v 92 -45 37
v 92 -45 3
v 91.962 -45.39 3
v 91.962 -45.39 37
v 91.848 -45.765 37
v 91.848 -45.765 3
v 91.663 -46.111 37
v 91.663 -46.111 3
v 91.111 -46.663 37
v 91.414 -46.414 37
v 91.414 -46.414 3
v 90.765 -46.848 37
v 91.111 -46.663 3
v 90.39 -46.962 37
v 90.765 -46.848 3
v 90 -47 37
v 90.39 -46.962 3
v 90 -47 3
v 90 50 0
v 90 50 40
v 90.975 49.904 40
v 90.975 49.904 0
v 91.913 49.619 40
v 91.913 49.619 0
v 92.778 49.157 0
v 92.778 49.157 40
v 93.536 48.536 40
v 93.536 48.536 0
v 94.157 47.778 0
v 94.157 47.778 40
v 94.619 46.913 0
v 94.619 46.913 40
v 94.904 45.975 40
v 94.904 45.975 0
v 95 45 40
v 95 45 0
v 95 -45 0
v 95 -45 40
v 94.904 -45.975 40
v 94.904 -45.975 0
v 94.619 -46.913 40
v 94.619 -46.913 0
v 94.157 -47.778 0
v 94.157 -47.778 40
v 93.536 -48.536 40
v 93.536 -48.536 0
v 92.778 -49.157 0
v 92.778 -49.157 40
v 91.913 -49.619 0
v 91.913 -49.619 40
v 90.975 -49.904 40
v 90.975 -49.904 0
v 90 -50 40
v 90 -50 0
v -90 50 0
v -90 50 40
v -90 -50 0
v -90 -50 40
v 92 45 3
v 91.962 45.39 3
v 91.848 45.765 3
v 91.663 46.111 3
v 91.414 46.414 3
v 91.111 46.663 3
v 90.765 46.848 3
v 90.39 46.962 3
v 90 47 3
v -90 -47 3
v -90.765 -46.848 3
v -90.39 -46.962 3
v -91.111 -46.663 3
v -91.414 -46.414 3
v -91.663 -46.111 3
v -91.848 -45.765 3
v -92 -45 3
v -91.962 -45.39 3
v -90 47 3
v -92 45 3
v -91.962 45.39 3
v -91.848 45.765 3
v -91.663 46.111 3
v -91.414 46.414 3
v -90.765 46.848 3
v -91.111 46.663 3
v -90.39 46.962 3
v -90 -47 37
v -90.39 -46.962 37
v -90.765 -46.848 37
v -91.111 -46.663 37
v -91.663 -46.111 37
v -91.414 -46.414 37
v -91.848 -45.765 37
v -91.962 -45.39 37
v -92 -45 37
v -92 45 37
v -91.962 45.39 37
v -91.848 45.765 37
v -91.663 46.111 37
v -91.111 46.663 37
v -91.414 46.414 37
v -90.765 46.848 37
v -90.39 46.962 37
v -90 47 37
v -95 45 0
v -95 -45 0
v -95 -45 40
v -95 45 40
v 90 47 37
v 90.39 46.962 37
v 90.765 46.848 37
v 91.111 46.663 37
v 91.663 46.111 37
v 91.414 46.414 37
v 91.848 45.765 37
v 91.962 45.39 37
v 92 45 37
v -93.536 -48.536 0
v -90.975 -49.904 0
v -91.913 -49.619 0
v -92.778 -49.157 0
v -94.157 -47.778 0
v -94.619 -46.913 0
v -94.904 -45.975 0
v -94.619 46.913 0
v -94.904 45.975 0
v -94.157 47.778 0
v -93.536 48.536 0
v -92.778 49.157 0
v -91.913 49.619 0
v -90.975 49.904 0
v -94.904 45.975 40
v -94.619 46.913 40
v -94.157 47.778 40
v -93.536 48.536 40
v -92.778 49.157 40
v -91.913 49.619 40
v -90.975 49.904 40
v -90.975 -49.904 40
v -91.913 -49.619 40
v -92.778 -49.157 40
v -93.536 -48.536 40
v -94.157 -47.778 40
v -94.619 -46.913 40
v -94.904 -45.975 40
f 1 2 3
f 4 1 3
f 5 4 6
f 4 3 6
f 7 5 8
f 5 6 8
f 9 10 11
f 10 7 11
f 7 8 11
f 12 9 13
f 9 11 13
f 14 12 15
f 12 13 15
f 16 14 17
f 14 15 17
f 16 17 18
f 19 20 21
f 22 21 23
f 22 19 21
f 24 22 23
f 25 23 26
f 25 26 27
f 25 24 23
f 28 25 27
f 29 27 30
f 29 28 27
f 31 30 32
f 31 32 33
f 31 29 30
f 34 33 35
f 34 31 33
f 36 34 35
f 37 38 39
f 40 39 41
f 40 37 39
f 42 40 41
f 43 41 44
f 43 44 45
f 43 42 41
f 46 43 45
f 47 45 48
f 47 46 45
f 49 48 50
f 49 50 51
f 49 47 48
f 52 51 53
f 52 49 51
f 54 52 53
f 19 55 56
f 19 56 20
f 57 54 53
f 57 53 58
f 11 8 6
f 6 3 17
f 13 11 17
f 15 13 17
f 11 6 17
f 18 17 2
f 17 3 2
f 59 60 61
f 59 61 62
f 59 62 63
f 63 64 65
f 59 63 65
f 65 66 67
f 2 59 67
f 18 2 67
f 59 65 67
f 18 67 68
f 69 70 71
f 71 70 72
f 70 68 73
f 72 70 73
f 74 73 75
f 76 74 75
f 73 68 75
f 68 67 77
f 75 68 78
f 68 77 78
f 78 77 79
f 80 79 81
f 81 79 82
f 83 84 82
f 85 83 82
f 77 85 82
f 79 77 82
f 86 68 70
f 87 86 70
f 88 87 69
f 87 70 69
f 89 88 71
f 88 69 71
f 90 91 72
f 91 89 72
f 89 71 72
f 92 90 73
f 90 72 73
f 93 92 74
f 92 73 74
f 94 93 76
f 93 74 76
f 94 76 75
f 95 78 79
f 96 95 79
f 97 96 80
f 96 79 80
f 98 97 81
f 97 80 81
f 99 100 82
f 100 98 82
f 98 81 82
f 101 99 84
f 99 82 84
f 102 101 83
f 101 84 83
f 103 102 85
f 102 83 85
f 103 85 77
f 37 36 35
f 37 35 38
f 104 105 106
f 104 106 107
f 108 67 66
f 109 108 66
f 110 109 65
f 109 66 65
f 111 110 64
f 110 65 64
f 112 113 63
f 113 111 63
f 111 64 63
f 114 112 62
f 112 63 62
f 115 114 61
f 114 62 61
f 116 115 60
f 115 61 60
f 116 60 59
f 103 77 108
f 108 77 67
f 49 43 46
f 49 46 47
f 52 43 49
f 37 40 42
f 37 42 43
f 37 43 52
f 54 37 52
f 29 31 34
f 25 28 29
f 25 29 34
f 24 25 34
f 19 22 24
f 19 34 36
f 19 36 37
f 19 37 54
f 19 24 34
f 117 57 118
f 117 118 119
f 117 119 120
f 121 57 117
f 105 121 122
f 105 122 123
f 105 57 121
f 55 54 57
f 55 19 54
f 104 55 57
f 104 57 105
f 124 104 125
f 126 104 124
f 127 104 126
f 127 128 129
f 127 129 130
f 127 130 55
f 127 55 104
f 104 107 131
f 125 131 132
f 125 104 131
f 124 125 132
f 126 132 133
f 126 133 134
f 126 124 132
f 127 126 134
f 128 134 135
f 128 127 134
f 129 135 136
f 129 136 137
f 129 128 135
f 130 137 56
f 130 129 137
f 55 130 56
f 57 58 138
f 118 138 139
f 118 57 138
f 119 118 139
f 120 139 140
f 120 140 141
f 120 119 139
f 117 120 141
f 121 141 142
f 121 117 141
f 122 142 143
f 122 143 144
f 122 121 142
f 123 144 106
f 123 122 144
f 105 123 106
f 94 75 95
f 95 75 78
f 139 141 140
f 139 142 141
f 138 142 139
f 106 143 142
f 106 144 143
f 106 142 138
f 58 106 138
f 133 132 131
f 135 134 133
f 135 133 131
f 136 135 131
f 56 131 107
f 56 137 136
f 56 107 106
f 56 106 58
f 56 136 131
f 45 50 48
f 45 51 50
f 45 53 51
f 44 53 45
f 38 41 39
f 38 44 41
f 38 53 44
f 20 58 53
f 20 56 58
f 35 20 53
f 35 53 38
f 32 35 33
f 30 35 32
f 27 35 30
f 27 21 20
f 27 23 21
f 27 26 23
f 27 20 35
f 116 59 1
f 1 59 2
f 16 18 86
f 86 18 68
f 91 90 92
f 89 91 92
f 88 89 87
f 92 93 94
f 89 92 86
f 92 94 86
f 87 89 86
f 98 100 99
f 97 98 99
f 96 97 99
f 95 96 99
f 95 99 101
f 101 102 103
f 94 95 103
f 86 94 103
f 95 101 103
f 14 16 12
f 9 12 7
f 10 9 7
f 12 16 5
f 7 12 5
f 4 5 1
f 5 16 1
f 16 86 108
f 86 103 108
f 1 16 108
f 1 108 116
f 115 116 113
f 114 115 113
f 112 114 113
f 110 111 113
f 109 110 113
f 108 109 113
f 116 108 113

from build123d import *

# Parameters (mm, degrees)
Y_KSEKLIK_EKSTR_ZYON1_DEPTH = 40
BO_ALTMA1_T                 = -3
Y_KSEKLIK_EKSTR_ZYON2_START = -3
Y_KSEKLIK_EKSTR_ZYON2_DEPTH = 3


with BuildPart() as part:
    # Çizim1 → Yükseklik-Ekstrüzyon1 (new body)
    with BuildSketch(Plane.XY):
        with BuildLine():
            Line((-90, 50), (90, 50))
            ThreePointArc((90, 50), (93.535533906, 48.535533906), (95, 45))
            Line((95, 45), (95, -45))
            ThreePointArc((95, -45), (93.535533906, -48.535533906), (90, -50))
            Line((90, -50), (-90, -50))
            ThreePointArc((-90, -50), (-93.535533906, -48.535533906), (-95, -45))
            Line((-95, -45), (-95, 45))
            ThreePointArc((-95, 45), (-93.535533906, 48.535533906), (-90, 50))
        make_face()
    extrude(amount=Y_KSEKLIK_EKSTR_ZYON1_DEPTH)

    # İç Boşaltma1
    bo_altma1_openings = [part.faces().sort_by_distance(p)[0] for p in [
        (0, 0, 40),
    ]]
    offset(amount=BO_ALTMA1_T, openings=bo_altma1_openings, kind=Kind.INTERSECTION)

    # Çizim2 → Yükseklik-Ekstrüzyon2 (add)
    with BuildSketch(Plane.XY.offset(40).offset(Y_KSEKLIK_EKSTR_ZYON2_START)):
        with BuildLine():
            Line((90, 47), (-90, 47))
            ThreePointArc((-90, 47), (-91.414213562, 46.414213562), (-92, 45))
            Line((-92, 45), (-92, -45))
            ThreePointArc((-92, -45), (-91.414213562, -46.414213562), (-90, -47))
            Line((-90, -47), (90, -47))
            ThreePointArc((90, -47), (91.414213562, -46.414213562), (92, -45))
            Line((92, -45), (92, 45))
            ThreePointArc((92, 45), (91.414213562, 46.414213562), (90, 47))
        make_face()
    extrude(amount=Y_KSEKLIK_EKSTR_ZYON2_DEPTH)


solid = part.part
